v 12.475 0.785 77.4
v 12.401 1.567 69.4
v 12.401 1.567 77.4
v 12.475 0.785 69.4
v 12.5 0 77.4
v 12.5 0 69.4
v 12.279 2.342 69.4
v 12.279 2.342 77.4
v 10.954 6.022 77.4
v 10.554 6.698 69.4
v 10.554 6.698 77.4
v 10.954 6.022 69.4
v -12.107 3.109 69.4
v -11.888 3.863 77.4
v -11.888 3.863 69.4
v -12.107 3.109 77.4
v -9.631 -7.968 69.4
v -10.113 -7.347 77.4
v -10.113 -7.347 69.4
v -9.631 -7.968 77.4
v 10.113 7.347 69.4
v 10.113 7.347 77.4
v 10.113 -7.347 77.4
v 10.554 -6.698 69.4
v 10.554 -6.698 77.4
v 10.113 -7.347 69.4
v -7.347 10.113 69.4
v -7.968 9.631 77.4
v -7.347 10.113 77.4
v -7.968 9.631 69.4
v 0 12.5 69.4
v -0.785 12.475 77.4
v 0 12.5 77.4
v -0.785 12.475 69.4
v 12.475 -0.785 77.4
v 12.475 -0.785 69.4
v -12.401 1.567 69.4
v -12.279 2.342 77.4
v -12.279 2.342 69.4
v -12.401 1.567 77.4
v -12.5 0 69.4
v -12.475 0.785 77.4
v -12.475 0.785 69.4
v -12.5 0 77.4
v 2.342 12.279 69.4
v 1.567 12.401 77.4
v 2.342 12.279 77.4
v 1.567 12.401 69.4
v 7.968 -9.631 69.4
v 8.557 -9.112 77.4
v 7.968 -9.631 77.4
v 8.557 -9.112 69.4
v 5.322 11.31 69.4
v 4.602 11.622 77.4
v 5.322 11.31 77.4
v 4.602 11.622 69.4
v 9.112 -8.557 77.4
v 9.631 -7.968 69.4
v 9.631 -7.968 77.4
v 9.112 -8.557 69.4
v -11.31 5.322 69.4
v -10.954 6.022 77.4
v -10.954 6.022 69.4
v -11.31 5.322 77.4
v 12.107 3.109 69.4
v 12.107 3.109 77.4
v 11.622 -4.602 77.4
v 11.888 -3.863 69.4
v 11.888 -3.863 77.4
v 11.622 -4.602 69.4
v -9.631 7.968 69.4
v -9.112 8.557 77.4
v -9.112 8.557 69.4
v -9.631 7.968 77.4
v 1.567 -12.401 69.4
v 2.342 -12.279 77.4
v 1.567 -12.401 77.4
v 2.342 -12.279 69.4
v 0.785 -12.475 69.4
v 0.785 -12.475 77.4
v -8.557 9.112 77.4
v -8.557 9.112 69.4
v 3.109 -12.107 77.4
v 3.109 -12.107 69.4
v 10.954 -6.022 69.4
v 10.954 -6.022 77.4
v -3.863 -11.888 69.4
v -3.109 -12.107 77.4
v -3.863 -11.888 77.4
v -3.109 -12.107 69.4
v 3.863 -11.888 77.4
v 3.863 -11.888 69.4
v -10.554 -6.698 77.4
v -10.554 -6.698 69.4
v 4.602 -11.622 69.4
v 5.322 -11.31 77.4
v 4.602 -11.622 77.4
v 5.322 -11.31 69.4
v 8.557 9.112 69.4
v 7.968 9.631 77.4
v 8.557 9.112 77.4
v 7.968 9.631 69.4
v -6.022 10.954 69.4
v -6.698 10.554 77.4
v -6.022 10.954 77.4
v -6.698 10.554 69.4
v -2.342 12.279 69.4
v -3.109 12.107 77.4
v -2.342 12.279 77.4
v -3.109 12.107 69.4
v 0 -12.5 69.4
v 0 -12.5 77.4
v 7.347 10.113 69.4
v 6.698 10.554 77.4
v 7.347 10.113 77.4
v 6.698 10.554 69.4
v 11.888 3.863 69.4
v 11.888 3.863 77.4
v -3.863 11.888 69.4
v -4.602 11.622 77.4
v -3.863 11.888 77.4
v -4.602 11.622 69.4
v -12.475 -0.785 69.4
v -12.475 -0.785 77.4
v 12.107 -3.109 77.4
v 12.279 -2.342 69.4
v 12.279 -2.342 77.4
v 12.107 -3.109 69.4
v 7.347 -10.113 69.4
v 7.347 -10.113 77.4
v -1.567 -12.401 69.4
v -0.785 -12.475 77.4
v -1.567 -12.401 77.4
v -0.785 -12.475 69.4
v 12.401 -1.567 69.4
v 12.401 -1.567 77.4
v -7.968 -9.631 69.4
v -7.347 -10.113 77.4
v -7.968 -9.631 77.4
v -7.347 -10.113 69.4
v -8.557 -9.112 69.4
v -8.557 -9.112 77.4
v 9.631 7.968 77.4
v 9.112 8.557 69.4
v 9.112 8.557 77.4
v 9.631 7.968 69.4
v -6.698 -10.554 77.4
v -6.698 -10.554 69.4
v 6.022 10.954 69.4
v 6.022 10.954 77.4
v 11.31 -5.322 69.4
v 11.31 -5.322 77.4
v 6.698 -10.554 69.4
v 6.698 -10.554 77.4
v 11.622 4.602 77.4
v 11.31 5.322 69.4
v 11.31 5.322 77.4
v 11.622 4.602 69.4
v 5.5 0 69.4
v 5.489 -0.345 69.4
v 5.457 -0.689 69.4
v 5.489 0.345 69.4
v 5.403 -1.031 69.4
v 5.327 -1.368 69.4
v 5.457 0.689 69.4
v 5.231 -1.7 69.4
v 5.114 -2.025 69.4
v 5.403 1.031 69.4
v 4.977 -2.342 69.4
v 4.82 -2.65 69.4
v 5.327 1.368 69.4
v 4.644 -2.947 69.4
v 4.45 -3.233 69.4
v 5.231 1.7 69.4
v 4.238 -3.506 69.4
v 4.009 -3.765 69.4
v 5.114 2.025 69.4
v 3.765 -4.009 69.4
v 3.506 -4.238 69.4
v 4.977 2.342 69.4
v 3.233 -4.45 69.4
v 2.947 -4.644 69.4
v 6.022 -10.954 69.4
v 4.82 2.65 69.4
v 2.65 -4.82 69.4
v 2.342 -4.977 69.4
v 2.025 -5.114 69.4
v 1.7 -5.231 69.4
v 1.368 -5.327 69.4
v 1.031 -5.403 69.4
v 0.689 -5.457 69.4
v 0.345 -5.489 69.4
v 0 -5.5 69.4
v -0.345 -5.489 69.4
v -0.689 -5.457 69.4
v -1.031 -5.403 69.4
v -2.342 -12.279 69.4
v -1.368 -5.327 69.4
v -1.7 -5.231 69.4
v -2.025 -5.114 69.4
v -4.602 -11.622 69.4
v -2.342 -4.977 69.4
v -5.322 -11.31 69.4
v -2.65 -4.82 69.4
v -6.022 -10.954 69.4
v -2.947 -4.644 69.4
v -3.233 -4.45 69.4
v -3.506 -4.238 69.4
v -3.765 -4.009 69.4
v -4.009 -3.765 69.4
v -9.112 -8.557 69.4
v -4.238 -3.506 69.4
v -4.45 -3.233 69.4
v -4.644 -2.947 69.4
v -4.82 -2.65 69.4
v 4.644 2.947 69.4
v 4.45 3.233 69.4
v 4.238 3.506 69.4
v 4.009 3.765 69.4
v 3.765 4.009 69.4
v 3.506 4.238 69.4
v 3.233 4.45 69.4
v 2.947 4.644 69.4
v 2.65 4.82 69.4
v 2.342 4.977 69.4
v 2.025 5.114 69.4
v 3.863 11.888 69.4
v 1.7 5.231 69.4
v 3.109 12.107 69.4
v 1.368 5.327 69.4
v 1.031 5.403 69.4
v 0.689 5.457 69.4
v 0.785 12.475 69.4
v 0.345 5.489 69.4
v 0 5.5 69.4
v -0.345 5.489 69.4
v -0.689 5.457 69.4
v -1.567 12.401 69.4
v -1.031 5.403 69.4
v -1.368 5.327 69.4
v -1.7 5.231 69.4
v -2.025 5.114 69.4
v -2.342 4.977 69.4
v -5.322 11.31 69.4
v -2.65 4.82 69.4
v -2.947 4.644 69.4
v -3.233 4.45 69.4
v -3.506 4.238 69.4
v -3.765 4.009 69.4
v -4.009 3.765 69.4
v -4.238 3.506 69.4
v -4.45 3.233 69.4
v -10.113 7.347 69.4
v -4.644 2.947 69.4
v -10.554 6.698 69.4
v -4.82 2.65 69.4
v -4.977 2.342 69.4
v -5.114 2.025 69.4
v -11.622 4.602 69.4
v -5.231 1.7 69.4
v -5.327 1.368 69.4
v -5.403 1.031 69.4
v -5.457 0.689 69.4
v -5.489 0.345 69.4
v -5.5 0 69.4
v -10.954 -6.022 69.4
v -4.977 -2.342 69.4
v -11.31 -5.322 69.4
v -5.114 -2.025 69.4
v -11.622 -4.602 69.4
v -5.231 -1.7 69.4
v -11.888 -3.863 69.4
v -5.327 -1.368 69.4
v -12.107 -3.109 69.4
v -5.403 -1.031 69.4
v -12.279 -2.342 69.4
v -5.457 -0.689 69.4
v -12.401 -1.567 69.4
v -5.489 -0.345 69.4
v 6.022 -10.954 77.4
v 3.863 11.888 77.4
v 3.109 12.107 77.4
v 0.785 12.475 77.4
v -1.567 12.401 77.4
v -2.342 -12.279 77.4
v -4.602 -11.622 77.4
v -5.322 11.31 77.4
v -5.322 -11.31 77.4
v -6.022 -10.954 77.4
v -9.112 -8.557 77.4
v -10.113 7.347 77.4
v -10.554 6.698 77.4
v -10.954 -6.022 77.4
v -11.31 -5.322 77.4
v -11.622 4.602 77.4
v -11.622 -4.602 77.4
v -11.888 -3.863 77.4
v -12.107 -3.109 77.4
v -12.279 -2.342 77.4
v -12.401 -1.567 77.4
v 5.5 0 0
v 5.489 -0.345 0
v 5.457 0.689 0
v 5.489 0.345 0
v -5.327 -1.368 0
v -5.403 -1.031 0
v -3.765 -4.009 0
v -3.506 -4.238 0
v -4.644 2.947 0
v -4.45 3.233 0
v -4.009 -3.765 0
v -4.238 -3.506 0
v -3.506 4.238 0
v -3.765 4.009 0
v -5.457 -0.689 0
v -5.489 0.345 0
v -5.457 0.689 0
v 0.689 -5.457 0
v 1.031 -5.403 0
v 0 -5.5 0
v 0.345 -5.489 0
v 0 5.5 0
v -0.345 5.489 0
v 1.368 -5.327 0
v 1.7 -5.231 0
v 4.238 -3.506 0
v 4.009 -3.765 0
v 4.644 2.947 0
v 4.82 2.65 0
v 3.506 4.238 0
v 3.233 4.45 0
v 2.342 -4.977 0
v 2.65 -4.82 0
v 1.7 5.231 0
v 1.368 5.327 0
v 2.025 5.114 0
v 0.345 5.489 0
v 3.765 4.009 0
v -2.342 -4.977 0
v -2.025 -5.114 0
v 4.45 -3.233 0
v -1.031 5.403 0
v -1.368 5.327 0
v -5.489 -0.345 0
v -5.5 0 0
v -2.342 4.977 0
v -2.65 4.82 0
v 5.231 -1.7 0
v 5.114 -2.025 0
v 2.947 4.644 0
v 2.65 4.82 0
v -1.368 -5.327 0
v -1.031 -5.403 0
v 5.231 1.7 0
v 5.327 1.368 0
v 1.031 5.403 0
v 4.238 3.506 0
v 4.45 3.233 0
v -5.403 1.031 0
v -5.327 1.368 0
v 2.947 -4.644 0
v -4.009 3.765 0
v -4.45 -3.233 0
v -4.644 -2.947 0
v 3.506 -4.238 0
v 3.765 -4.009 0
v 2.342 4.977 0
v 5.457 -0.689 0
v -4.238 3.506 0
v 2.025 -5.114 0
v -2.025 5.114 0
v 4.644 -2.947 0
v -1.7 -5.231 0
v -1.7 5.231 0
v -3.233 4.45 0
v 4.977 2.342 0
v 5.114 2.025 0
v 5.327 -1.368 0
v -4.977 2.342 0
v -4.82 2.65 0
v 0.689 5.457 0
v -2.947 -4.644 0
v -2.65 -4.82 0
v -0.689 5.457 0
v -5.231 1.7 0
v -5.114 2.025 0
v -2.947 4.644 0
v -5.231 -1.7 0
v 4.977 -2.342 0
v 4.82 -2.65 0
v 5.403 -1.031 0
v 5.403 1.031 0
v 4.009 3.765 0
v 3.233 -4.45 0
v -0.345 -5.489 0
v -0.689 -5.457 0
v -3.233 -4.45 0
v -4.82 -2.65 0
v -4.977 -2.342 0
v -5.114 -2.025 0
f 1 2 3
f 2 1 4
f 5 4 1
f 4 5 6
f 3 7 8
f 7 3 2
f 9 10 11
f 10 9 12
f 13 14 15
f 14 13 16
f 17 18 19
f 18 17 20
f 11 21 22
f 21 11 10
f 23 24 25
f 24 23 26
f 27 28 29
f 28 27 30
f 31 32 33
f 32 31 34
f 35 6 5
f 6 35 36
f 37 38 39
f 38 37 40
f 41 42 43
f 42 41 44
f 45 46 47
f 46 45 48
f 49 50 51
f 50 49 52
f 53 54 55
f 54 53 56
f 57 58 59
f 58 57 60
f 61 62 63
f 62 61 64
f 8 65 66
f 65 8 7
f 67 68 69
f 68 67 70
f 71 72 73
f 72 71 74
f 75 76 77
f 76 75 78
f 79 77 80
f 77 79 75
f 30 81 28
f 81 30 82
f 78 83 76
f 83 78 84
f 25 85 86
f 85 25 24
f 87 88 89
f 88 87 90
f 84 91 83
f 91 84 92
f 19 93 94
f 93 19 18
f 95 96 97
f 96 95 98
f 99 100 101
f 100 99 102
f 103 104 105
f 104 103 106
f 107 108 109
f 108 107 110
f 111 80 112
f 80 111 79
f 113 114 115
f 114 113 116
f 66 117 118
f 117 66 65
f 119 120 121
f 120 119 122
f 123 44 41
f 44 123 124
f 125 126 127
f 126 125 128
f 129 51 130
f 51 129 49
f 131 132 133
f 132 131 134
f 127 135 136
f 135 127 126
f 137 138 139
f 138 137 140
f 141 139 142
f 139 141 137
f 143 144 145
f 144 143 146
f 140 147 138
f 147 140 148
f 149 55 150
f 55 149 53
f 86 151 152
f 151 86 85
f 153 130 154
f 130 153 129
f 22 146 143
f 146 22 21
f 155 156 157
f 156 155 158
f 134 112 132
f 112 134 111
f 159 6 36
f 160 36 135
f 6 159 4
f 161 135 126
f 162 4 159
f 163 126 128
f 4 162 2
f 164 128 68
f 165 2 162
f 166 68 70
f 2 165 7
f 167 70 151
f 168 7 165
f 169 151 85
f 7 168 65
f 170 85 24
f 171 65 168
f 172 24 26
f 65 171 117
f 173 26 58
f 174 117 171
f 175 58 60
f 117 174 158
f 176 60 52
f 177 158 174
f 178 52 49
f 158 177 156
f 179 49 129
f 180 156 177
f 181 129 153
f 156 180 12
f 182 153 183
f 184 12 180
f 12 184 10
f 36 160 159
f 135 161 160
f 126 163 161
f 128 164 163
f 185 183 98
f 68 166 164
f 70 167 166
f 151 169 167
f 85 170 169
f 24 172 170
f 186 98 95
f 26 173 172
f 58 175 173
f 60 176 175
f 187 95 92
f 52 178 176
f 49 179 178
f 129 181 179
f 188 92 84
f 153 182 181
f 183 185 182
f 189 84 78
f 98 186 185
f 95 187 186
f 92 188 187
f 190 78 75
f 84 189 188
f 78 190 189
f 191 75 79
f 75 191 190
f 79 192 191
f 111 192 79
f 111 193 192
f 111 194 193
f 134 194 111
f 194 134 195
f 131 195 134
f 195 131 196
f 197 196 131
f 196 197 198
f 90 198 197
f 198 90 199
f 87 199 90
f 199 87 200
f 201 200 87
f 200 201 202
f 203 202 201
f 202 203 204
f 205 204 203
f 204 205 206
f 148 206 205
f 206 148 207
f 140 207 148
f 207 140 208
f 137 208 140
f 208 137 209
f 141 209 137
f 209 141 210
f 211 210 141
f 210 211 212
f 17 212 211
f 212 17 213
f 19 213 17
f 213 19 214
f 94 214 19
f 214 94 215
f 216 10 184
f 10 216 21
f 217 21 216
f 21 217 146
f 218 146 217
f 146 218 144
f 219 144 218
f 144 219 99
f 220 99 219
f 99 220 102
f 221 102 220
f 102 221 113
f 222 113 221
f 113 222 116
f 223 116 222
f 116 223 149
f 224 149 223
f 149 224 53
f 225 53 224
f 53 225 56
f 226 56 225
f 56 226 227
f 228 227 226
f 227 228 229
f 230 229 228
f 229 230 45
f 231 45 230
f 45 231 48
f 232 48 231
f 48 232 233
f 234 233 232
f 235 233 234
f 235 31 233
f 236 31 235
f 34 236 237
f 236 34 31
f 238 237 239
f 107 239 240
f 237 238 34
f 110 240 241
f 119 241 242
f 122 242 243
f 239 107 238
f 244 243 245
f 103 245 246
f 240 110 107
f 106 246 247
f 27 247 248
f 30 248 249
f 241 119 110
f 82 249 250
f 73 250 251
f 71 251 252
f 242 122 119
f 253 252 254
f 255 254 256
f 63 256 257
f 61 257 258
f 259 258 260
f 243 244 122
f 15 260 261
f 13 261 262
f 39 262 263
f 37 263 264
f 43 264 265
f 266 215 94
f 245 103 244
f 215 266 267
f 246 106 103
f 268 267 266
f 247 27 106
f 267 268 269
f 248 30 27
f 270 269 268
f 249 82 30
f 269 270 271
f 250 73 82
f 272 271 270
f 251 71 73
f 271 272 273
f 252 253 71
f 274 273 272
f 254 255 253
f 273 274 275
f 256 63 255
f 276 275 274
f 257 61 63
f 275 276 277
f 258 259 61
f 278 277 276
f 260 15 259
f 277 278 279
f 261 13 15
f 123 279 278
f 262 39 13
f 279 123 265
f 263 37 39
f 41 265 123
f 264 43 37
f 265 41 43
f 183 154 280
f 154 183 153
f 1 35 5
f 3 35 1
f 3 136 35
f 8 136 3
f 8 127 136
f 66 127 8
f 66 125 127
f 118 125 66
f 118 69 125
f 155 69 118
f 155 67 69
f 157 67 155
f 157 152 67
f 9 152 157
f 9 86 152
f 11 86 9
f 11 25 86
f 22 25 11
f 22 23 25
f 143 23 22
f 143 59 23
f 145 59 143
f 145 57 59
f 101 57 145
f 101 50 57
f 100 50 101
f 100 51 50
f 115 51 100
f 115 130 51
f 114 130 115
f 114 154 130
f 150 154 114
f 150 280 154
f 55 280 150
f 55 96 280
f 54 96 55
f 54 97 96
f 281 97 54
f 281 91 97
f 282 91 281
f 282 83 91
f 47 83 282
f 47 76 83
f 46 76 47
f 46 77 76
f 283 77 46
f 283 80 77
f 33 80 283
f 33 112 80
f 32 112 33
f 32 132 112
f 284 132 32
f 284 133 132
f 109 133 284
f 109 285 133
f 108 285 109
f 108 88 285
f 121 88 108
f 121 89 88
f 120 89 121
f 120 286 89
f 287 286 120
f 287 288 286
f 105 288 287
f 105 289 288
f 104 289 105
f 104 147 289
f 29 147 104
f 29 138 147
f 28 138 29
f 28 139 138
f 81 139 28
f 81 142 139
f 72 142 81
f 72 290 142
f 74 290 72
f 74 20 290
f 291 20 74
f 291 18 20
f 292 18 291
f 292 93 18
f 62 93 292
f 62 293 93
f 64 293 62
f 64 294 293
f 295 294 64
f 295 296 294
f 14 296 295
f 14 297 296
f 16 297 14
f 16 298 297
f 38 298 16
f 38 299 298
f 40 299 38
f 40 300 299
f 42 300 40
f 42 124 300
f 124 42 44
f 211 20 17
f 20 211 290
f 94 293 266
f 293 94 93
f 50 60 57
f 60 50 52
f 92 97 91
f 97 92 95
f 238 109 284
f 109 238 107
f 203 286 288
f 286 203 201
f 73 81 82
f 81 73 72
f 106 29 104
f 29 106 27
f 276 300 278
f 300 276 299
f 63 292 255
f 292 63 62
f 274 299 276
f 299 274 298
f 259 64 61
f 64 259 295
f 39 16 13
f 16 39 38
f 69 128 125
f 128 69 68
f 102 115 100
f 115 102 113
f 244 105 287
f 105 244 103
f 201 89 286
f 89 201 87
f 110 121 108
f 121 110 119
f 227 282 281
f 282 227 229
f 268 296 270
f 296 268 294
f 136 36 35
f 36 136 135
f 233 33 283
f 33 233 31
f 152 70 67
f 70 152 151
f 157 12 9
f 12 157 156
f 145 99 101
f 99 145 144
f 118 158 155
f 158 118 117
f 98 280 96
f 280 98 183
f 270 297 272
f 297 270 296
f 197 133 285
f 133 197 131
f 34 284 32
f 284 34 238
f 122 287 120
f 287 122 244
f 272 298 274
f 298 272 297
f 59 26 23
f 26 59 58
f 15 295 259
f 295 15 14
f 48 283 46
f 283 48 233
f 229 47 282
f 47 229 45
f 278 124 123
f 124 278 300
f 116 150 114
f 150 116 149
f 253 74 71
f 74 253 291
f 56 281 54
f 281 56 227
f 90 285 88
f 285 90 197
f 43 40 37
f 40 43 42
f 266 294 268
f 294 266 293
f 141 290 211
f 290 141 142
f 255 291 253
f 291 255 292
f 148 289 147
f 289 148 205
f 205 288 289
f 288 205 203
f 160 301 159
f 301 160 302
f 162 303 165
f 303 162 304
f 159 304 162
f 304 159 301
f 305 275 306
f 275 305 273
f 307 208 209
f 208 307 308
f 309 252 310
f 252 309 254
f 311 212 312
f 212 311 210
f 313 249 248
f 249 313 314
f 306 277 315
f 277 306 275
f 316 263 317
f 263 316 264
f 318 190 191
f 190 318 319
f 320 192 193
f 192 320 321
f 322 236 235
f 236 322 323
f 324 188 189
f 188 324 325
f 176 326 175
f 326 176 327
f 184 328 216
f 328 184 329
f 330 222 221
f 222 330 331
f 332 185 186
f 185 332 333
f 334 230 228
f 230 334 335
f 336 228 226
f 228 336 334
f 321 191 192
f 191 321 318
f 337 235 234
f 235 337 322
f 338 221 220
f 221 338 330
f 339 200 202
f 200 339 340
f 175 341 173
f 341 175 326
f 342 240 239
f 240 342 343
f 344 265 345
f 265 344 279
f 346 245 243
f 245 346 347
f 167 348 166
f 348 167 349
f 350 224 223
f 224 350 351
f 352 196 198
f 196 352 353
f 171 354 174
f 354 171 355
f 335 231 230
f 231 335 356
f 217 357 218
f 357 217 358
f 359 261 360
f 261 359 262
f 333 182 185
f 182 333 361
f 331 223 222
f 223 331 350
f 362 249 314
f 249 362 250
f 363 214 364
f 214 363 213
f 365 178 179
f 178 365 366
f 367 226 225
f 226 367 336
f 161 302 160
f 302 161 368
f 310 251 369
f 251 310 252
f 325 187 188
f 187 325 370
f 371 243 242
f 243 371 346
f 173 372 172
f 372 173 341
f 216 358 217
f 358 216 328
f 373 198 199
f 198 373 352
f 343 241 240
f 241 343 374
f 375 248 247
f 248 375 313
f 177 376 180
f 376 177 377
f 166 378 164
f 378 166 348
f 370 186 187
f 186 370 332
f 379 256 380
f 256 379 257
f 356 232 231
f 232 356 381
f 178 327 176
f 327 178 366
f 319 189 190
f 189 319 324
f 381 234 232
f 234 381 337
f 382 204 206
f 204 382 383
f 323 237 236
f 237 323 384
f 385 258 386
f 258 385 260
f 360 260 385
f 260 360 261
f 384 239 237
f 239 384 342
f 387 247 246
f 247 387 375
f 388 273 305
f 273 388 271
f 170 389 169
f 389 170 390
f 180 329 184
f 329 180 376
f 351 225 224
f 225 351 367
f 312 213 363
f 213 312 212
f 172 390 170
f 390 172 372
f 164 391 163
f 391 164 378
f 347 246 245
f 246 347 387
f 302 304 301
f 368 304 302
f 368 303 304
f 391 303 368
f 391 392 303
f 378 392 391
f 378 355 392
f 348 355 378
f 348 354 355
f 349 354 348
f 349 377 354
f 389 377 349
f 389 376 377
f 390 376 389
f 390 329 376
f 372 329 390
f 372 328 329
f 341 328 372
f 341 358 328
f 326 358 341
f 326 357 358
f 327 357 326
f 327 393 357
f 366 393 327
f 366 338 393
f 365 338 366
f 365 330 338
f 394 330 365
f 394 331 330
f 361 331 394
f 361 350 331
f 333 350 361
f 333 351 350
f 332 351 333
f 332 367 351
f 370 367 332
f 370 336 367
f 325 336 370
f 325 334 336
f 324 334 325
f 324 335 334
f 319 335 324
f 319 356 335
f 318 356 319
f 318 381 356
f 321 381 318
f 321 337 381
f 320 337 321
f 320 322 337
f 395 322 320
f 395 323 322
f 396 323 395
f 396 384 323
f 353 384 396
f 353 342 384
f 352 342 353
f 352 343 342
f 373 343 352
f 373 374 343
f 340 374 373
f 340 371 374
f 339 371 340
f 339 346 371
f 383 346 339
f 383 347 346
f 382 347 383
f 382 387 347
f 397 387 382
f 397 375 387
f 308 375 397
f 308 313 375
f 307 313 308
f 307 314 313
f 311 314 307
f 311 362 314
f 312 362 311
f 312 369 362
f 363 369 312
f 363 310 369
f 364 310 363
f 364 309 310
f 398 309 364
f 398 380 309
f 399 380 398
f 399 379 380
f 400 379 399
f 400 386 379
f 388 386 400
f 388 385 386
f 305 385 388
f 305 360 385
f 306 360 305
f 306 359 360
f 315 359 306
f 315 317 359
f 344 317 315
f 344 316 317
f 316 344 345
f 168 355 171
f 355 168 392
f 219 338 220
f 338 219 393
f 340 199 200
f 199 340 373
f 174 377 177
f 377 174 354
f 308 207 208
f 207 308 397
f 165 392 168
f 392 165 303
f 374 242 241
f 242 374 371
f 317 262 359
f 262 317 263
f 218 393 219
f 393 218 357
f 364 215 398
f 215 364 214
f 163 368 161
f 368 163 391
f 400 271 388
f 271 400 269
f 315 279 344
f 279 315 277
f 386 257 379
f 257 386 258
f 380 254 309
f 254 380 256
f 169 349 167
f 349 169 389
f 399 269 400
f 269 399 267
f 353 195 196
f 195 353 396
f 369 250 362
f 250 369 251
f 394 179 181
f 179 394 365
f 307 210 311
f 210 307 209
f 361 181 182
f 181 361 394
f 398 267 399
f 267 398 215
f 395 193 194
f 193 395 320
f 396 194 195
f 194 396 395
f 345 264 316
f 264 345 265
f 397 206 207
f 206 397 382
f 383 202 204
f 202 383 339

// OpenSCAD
// Bolt for rock wall assignment
// Inane imperial units inexplicably in use in a free state: 3/8" - 16x2-1/2"
// All measurements below in mm

//Bolt head diamter with clearance for tool
B=25;

// Bolt head height
h=8;

// Bolt overall length
l=69.5;

// diamter
d=11;

$fn=100;

module bolt(){
union(){
		translate([0,0,l-0.1])cylinder(h=h, r=B/2); //space for head
		cylinder(h=l, r=d/2); // bolt shaft
		}
					}

bolt();
